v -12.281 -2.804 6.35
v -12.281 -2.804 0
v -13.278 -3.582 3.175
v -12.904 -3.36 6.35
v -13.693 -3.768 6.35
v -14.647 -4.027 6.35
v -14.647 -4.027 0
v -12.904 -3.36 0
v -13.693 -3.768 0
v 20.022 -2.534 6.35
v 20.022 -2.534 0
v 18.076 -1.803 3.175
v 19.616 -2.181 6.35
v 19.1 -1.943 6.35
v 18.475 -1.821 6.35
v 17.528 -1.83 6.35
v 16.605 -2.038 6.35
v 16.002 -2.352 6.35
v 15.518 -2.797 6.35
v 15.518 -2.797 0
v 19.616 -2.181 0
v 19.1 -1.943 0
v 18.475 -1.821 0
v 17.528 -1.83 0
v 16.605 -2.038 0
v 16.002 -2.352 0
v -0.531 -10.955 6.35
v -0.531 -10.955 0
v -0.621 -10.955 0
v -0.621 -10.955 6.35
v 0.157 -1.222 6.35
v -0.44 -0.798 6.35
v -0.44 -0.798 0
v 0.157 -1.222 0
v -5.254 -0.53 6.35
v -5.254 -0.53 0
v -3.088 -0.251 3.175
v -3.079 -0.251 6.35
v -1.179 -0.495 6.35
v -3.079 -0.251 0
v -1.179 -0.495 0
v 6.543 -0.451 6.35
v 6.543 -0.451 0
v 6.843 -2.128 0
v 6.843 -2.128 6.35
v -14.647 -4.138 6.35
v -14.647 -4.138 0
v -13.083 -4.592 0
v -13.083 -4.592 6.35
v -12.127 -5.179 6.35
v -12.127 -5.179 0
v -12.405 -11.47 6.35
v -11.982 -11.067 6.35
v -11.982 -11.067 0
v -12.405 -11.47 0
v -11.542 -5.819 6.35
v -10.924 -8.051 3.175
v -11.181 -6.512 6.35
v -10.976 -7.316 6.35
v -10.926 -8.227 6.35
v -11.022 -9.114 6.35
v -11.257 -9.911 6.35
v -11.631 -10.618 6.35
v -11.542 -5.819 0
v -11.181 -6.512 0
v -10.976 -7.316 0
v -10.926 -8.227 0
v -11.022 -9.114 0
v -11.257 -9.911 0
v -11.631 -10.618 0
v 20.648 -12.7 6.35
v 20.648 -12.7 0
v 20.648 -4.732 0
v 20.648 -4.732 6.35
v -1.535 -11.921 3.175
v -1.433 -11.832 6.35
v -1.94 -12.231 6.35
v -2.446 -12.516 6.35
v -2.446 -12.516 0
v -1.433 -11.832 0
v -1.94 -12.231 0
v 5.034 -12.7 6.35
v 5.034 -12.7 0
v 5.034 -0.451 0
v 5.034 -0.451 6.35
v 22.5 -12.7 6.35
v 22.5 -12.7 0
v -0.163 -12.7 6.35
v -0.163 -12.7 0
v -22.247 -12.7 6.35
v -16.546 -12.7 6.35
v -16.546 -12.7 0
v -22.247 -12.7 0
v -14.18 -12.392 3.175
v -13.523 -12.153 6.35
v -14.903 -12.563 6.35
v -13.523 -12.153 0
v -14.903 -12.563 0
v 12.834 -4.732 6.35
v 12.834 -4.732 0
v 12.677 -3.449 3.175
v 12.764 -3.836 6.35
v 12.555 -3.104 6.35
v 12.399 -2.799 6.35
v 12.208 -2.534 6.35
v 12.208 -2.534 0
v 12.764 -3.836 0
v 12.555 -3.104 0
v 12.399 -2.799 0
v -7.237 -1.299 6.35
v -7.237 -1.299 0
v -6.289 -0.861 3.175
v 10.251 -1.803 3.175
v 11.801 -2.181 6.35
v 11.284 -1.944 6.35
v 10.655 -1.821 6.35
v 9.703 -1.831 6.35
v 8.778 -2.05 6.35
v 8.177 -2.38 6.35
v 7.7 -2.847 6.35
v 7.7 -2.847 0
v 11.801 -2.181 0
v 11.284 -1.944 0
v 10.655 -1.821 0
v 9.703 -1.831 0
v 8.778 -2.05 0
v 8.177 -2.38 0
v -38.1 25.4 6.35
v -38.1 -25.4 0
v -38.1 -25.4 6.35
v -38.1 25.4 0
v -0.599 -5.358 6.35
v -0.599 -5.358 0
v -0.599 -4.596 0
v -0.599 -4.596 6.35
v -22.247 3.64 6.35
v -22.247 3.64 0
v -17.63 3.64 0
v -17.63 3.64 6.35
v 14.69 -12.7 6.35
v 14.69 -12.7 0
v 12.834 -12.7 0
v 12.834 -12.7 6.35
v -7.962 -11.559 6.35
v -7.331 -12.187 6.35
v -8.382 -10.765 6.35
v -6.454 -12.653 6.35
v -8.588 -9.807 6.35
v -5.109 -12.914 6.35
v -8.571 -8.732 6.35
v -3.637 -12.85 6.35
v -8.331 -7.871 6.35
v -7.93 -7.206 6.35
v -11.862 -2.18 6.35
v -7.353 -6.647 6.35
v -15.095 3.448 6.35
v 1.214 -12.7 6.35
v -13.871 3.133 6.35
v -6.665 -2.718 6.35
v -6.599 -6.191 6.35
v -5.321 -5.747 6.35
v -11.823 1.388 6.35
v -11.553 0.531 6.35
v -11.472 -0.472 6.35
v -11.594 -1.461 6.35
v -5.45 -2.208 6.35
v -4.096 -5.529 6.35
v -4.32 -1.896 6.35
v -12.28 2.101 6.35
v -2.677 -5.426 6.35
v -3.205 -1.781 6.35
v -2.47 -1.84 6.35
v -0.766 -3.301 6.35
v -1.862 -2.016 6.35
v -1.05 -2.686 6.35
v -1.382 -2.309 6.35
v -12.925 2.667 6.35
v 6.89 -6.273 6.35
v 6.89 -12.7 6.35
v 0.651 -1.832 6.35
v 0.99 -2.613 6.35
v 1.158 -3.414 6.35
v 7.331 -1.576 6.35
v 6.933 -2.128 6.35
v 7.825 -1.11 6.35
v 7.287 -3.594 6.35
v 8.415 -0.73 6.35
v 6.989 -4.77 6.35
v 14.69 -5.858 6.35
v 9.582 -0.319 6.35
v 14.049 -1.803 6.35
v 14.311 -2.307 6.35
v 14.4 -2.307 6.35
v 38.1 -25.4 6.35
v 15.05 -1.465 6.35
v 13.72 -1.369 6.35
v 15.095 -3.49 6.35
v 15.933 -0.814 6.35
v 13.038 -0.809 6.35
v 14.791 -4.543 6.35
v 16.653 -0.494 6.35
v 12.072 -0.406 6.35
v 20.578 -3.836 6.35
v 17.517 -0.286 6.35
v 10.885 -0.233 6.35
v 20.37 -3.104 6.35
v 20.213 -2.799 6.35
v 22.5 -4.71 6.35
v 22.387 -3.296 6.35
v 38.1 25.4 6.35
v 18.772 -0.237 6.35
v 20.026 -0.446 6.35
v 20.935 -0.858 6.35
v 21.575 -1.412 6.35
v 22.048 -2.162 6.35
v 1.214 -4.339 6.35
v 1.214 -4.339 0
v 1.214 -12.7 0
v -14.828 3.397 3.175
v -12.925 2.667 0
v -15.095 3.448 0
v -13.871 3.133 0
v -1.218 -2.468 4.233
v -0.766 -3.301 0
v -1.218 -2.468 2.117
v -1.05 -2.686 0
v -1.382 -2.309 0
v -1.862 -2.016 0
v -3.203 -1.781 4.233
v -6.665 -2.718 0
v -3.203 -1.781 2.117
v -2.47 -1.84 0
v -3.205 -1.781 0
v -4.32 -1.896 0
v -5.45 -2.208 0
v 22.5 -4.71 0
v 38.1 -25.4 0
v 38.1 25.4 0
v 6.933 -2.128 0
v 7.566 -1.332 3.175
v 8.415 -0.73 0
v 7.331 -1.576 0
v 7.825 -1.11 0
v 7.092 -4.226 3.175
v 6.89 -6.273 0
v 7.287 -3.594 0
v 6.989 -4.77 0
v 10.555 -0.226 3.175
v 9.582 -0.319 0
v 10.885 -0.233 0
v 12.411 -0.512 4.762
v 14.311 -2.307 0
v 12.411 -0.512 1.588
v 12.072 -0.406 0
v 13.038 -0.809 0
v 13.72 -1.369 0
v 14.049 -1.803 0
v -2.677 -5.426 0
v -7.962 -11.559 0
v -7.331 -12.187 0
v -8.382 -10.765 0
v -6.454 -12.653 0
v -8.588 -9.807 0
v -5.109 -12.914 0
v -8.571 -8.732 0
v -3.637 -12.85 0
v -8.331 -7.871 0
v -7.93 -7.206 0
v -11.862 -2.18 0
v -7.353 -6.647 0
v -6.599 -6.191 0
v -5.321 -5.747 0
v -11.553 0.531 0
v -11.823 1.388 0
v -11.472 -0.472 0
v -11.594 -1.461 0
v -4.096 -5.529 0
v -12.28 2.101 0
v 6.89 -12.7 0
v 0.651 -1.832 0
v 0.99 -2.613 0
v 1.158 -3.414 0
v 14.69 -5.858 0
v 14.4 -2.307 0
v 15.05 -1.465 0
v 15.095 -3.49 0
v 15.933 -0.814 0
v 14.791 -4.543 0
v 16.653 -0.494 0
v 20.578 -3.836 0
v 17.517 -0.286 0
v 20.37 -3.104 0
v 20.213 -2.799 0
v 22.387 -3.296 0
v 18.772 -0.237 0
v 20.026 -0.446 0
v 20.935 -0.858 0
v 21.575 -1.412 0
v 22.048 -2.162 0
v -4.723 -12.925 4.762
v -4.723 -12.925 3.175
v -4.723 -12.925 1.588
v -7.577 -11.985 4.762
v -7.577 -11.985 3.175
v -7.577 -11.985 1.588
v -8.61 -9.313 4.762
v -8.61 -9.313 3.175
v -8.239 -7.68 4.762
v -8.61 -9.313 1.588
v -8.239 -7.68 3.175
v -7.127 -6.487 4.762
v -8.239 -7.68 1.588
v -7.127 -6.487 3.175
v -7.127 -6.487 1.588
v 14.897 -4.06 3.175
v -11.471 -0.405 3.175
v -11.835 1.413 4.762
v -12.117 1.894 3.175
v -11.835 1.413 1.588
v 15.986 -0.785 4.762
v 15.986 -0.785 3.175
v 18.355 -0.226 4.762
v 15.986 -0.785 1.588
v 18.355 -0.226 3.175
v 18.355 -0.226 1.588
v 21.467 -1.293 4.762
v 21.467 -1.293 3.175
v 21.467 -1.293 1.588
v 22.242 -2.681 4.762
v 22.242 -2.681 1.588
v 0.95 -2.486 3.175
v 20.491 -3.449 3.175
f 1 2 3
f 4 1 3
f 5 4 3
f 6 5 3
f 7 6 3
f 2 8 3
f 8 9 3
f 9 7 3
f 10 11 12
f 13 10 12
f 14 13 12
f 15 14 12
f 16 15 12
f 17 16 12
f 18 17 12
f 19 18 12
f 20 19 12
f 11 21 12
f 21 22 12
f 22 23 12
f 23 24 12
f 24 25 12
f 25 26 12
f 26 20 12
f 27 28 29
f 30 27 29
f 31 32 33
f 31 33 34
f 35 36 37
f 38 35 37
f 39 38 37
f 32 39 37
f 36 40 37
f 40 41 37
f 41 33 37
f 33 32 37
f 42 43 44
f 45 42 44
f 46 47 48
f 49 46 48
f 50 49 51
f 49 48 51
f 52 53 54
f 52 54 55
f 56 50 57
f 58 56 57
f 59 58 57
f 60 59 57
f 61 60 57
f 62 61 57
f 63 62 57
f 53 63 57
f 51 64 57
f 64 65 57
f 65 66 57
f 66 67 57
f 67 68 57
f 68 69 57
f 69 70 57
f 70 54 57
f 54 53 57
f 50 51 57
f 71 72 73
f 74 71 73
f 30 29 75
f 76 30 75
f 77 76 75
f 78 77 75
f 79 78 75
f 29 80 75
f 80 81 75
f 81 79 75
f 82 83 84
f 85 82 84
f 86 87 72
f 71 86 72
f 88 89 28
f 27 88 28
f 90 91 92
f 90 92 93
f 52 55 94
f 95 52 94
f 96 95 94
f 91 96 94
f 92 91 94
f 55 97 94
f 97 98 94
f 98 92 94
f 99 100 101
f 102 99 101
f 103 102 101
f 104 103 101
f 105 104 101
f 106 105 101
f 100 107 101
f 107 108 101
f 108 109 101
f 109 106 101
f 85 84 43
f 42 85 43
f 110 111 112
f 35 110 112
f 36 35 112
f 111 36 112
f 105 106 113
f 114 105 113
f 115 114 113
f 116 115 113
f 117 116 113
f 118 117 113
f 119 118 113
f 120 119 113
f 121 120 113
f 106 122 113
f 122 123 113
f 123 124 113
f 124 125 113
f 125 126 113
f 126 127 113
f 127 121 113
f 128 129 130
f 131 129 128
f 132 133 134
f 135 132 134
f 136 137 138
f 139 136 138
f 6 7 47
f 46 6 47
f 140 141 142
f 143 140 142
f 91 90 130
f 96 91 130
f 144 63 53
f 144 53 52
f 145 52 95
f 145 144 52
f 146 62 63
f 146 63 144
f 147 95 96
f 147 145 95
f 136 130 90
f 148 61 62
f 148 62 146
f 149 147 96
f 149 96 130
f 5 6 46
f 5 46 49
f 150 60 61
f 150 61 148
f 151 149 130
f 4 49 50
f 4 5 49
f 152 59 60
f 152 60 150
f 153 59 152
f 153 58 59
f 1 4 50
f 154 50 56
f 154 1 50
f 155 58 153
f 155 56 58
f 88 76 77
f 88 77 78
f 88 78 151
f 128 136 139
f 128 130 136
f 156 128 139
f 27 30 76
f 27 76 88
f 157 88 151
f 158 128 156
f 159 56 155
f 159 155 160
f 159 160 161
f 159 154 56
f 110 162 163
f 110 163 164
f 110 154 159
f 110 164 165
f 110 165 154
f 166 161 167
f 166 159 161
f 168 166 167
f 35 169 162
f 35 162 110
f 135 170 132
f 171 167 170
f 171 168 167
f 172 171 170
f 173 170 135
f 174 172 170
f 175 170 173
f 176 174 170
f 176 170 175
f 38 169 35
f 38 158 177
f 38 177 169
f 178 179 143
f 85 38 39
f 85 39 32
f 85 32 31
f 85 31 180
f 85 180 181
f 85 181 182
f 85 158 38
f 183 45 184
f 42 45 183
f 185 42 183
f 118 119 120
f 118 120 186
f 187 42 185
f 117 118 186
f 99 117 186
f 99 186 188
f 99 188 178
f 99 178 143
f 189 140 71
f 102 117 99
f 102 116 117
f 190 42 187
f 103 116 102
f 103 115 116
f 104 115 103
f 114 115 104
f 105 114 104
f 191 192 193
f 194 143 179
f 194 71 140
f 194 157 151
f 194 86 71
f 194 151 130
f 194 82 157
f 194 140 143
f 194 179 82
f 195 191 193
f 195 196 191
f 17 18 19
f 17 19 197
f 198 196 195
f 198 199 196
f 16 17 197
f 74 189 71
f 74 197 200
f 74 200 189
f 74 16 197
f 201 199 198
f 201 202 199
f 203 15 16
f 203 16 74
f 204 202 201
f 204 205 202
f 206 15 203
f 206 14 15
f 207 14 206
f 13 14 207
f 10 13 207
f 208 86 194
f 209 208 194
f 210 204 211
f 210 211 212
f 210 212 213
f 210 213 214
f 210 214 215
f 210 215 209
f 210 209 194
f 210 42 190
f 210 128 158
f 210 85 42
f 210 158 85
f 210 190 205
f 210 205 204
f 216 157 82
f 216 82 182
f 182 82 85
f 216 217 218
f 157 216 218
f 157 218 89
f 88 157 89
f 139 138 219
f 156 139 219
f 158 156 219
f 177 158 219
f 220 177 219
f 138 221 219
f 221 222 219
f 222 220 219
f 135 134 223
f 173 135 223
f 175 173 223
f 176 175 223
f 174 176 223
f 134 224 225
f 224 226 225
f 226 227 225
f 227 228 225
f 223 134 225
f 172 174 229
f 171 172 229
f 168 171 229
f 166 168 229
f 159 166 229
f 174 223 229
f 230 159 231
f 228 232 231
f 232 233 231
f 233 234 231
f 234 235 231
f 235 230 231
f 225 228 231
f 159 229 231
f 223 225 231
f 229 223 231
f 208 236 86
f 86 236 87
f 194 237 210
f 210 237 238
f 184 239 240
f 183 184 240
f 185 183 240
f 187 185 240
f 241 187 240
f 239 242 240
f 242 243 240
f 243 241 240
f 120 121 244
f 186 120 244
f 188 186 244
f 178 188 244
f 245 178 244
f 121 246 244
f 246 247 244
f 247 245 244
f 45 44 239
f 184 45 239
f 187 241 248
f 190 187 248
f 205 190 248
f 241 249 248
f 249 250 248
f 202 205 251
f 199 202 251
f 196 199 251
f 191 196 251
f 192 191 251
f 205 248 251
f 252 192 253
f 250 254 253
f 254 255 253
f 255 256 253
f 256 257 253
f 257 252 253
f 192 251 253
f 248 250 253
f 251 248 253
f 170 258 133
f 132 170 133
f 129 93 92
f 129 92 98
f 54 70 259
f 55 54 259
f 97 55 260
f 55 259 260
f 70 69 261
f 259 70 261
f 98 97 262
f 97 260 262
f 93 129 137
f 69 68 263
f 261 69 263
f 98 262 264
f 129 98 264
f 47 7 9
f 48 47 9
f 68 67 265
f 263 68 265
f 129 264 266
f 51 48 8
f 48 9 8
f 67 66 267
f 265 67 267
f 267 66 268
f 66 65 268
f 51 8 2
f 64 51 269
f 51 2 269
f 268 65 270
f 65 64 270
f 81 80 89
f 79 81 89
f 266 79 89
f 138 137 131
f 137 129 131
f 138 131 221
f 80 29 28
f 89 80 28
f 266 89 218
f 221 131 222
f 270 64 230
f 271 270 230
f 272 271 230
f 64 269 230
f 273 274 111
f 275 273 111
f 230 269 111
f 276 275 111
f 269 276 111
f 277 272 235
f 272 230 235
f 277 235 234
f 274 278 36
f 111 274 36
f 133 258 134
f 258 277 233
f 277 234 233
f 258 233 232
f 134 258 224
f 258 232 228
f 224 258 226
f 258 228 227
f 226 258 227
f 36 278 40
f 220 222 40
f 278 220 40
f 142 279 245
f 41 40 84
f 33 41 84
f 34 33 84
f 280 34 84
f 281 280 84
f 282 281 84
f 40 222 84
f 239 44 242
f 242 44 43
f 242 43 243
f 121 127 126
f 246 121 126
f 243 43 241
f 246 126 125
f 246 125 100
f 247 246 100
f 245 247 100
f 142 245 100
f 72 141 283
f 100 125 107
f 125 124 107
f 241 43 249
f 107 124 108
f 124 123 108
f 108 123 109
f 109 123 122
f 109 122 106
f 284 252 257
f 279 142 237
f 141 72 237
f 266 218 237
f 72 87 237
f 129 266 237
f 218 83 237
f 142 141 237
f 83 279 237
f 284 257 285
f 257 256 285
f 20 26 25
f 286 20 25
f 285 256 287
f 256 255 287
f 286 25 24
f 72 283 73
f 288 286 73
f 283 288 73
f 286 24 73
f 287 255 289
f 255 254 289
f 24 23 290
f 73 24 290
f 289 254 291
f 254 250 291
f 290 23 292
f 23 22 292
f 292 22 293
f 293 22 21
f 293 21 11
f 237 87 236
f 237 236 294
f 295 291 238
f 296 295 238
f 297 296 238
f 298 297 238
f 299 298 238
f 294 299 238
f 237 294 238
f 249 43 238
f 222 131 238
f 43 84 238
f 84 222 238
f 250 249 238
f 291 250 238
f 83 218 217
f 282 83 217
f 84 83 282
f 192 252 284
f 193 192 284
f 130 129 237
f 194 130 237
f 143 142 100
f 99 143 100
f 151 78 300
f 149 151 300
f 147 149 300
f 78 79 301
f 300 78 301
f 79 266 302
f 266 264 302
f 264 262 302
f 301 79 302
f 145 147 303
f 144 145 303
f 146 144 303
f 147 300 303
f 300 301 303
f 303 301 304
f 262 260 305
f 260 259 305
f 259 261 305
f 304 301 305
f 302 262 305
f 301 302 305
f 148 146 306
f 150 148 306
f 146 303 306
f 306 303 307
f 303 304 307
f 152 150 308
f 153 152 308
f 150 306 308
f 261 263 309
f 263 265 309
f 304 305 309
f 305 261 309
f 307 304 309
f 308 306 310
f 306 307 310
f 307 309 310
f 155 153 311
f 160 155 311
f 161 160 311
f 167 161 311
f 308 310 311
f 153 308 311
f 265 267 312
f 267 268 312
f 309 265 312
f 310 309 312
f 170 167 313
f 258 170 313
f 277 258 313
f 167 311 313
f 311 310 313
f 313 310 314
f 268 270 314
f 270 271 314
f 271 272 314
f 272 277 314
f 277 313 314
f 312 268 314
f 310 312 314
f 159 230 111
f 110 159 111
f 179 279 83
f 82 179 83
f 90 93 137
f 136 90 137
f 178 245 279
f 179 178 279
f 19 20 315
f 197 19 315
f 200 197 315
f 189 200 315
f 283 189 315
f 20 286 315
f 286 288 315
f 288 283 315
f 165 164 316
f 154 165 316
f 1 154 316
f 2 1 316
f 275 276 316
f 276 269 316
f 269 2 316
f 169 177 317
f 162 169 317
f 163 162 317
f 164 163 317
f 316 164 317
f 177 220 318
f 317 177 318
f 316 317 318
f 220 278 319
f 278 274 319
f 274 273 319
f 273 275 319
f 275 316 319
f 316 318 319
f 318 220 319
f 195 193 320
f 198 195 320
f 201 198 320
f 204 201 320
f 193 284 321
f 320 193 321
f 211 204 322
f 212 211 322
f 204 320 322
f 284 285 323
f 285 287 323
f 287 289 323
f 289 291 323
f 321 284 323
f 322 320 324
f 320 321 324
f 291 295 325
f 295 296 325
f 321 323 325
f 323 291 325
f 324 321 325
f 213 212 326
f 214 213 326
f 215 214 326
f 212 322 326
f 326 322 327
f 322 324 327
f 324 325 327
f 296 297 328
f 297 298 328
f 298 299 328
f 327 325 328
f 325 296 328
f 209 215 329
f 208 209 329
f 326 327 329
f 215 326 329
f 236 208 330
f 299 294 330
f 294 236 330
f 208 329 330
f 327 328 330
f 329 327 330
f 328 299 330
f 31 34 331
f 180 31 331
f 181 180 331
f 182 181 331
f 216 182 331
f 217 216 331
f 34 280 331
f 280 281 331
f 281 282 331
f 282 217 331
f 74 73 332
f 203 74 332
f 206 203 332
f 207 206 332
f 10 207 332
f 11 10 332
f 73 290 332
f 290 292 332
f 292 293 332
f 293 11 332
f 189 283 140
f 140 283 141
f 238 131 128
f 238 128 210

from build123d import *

# Parameters (mm, degrees)
F0_W     = 76.2
F0_H     = 50.8
F1_DEPTH = 6.35


with BuildPart() as f1:
    # F0 (on Top) → F1 (new body)
    with BuildSketch(Plane.XY):
        Rectangle(F0_W, F0_H)
        with BuildLine():
            Line((1.2140801556, -12.7), (-0.1628037906, -12.7))
            Line((-0.1628037906, -12.7), (-0.5311649502, -10.9547548942))
            Line((-0.5311649502, -10.9547548942), (-0.6205729987, -10.9547548942))
            add(Edge.make_bspline(
                [(-0.6205729987, -10.9547548942), (-1.5361114148, -12.1063305583), (-2.446285348, -12.5158194202)],
                knots=[0, 0, 0, 1, 1, 1], degree=2))
            add(Edge.make_bspline(
                [(-2.446285348, -12.5158194202), (-3.3564592813, -12.9253082821), (-4.7226142616, -12.9253082821)],
                knots=[0, 0, 0, 1, 1, 1], degree=2))
            add(Edge.make_bspline(
                [(-4.7226142616, -12.9253082821), (-6.5429621281, -12.9253082821), (-7.5765191682, -11.9847356124)],
                knots=[0, 0, 0, 1, 1, 1], degree=2))
            add(Edge.make_bspline(
                [(-7.5765191682, -11.9847356124), (-8.6100762083, -11.0441629427), (-8.6100762083, -9.3132231247)],
                knots=[0, 0, 0, 1, 1, 1], degree=2))
            add(Edge.make_bspline(
                [(-8.6100762083, -9.3132231247), (-8.6100762083, -5.6045772749), (-2.676958113, -5.425761178)],
                knots=[0, 0, 0, 1, 1, 1], degree=2))
            Line((-2.676958113, -5.425761178), (-0.599115067, -5.3578110612))
            Line((-0.599115067, -5.3578110612), (-0.599115067, -4.5960544884))
            add(Edge.make_bspline(
                [(-0.599115067, -4.5960544884), (-0.599115067, -3.1547967473), (-1.2178187623, -2.4681429352)],
                knots=[0, 0, 0, 1, 1, 1], degree=2))
            add(Edge.make_bspline(
                [(-1.2178187623, -2.4681429352), (-1.8365224576, -1.7814891231), (-3.2026774379, -1.7814891231)],
                knots=[0, 0, 0, 1, 1, 1], degree=2))
            add(Edge.make_bspline(
                [(-3.2026774379, -1.7814891231), (-4.7333432274, -1.7814891231), (-6.664557074, -2.7184854709)],
                knots=[0, 0, 0, 1, 1, 1], degree=2))
            Line((-6.664557074, -2.7184854709), (-7.236768584, -1.2986856615))
            add(Edge.make_bspline(
                [(-7.236768584, -1.2986856615), (-6.3319591337, -0.808729556), (-5.2536980694, -0.5297764448)],
                knots=[0, 0, 0, 1, 1, 1], degree=2))
            add(Edge.make_bspline(
                [(-5.2536980694, -0.5297764448), (-4.1754370051, -0.2508233337), (-3.0882351359, -0.2508233337)],
                knots=[0, 0, 0, 1, 1, 1], degree=2))
            add(Edge.make_bspline(
                [(-3.0882351359, -0.2508233337), (-0.8995261098, -0.2508233337), (0.1572770229, -1.2217947398)],
                knots=[0, 0, 0, 1, 1, 1], degree=2))
            add(Edge.make_bspline(
                [(0.1572770229, -1.2217947398), (1.2140801556, -2.192766146), (1.2140801556, -4.3385593088)],
                knots=[0, 0, 0, 1, 1, 1], degree=2))
            Line((1.2140801556, -4.3385593088), (1.2140801556, -12.7))
        make_face(mode=Mode.SUBTRACT)
        with BuildLine():
            Line((-22.246591758, -12.7), (-22.246591758, 3.6402149349))
            Line((-22.246591758, 3.6402149349), (-17.629560136, 3.6402149349))
            add(Edge.make_bspline(
                [(-17.629560136, 3.6402149349), (-14.3786834943, 3.6402149349), (-12.9249086265, 2.6674553678)],
                knots=[0, 0, 0, 1, 1, 1], degree=2))
            add(Edge.make_bspline(
                [(-12.9249086265, 2.6674553678), (-11.4711337587, 1.6946958006), (-11.4711337587, -0.404605177)],
                knots=[0, 0, 0, 1, 1, 1], degree=2))
            add(Edge.make_bspline(
                [(-11.4711337587, -0.404605177), (-11.4711337587, -1.8601682058), (-12.2811706777, -2.8043171974)],
                knots=[0, 0, 0, 1, 1, 1], degree=2))
            add(Edge.make_bspline(
                [(-12.2811706777, -2.8043171974), (-13.0912075966, -3.7484661891), (-14.6469076397, -4.0274193002)],
                knots=[0, 0, 0, 1, 1, 1], degree=2))
            Line((-14.6469076397, -4.0274193002), (-14.6469076397, -4.1382852803))
            add(Edge.make_bspline(
                [(-14.6469076397, -4.1382852803), (-10.9239565022, -4.7748705853), (-10.9239565022, -8.0507814805)],
                knots=[0, 0, 0, 1, 1, 1], degree=2))
            add(Edge.make_bspline(
                [(-10.9239565022, -8.0507814805), (-10.9239565022, -10.2394905066), (-12.4045537845, -11.4697452533)],
                knots=[0, 0, 0, 1, 1, 1], degree=2))
            add(Edge.make_bspline(
                [(-12.4045537845, -11.4697452533), (-13.8851510669, -12.7), (-16.5459345888, -12.7)],
                knots=[0, 0, 0, 1, 1, 1], degree=2))
            Line((-16.5459345888, -12.7), (-22.246591758, -12.7))
        make_face(mode=Mode.SUBTRACT)
        with BuildLine():
            Line((22.5003483308, -12.7), (20.6478135669, -12.7))
            Line((20.6478135669, -12.7), (20.6478135669, -4.731954722))
            add(Edge.make_bspline(
                [(20.6478135669, -4.731954722), (20.6478135669, -3.2656627274), (20.0219572278, -2.5343048911)],
                knots=[0, 0, 0, 1, 1, 1], degree=2))
            add(Edge.make_bspline(
                [(20.0219572278, -2.5343048911), (19.3961008886, -1.8029470548), (18.0764380935, -1.8029470548)],
                knots=[0, 0, 0, 1, 1, 1], degree=2))
            add(Edge.make_bspline(
                [(18.0764380935, -1.8029470548), (16.3454982755, -1.8029470548), (15.5175797468, -2.7971645535)],
                knots=[0, 0, 0, 1, 1, 1], degree=2))
            add(Edge.make_bspline(
                [(15.5175797468, -2.7971645535), (14.6896612181, -3.7913820523), (14.6896612181, -5.8584961325)],
                knots=[0, 0, 0, 1, 1, 1], degree=2))
            Line((14.6896612181, -5.8584961325), (14.6896612181, -12.7))
            Line((14.6896612181, -12.7), (12.8335501323, -12.7))
            Line((12.8335501323, -12.7), (12.8335501323, -4.731954722))
            add(Edge.make_bspline(
                [(12.8335501323, -4.731954722), (12.8335501323, -3.2656627274), (12.2076937931, -2.5343048911)],
                knots=[0, 0, 0, 1, 1, 1], degree=2))
            add(Edge.make_bspline(
                [(12.2076937931, -2.5343048911), (11.581837454, -1.8029470548), (10.251445693, -1.8029470548)],
                knots=[0, 0, 0, 1, 1, 1], degree=2))
            add(Edge.make_bspline(
                [(10.251445693, -1.8029470548), (8.5097769092, -1.8029470548), (7.6997399902, -2.8472330607)],
                knots=[0, 0, 0, 1, 1, 1], degree=2))
            add(Edge.make_bspline(
                [(7.6997399902, -2.8472330607), (6.8897030713, -3.8915190666), (6.8897030713, -6.2733494773)],
                knots=[0, 0, 0, 1, 1, 1], degree=2))
            Line((6.8897030713, -6.2733494773), (6.8897030713, -12.7))
            Line((6.8897030713, -12.7), (5.0335919854, -12.7))
            Line((5.0335919854, -12.7), (5.0335919854, -0.4510973622))
            Line((5.0335919854, -0.4510973622), (6.5427998433, -0.4510973622))
            Line((6.5427998433, -0.4510973622), (6.8432108861, -2.1283923511))
            Line((6.8432108861, -2.1283923511), (6.9326189345, -2.1283923511))
            add(Edge.make_bspline(
                [(6.9326189345, -2.1283923511), (7.4583382594, -1.2343118666), (8.4150043778, -0.7300504733)],
                knots=[0, 0, 0, 1, 1, 1], degree=2))
            add(Edge.make_bspline(
                [(8.4150043778, -0.7300504733), (9.3716704963, -0.2257890801), (10.5554330578, -0.2257890801)],
                knots=[0, 0, 0, 1, 1, 1], degree=2))
            add(Edge.make_bspline(
                [(10.5554330578, -0.2257890801), (13.427219574, -0.2257890801), (14.3105710927, -2.307208448)],
                knots=[0, 0, 0, 1, 1, 1], degree=2))
            Line((14.3105710927, -2.307208448), (14.3999791412, -2.307208448))
            add(Edge.make_bspline(
                [(14.3999791412, -2.307208448), (14.9471563977, -1.3451778467), (15.9860779207, -0.7854834634)],
                knots=[0, 0, 0, 1, 1, 1], degree=2))
            add(Edge.make_bspline(
                [(15.9860779207, -0.7854834634), (17.0249994437, -0.2257890801), (18.3553912046, -0.2257890801)],
                knots=[0, 0, 0, 1, 1, 1], degree=2))
            add(Edge.make_bspline(
                [(18.3553912046, -0.2257890801), (20.4332342506, -0.2257890801), (21.4667912907, -1.2933211786)],
                knots=[0, 0, 0, 1, 1, 1], degree=2))
            add(Edge.make_bspline(
                [(21.4667912907, -1.2933211786), (22.5003483308, -2.3608532771), (22.5003483308, -4.7104967904)],
                knots=[0, 0, 0, 1, 1, 1], degree=2))
            Line((22.5003483308, -4.7104967904), (22.5003483308, -12.7))
        make_face(mode=Mode.SUBTRACT)
    extrude(amount=F1_DEPTH)


solid = f1.part
